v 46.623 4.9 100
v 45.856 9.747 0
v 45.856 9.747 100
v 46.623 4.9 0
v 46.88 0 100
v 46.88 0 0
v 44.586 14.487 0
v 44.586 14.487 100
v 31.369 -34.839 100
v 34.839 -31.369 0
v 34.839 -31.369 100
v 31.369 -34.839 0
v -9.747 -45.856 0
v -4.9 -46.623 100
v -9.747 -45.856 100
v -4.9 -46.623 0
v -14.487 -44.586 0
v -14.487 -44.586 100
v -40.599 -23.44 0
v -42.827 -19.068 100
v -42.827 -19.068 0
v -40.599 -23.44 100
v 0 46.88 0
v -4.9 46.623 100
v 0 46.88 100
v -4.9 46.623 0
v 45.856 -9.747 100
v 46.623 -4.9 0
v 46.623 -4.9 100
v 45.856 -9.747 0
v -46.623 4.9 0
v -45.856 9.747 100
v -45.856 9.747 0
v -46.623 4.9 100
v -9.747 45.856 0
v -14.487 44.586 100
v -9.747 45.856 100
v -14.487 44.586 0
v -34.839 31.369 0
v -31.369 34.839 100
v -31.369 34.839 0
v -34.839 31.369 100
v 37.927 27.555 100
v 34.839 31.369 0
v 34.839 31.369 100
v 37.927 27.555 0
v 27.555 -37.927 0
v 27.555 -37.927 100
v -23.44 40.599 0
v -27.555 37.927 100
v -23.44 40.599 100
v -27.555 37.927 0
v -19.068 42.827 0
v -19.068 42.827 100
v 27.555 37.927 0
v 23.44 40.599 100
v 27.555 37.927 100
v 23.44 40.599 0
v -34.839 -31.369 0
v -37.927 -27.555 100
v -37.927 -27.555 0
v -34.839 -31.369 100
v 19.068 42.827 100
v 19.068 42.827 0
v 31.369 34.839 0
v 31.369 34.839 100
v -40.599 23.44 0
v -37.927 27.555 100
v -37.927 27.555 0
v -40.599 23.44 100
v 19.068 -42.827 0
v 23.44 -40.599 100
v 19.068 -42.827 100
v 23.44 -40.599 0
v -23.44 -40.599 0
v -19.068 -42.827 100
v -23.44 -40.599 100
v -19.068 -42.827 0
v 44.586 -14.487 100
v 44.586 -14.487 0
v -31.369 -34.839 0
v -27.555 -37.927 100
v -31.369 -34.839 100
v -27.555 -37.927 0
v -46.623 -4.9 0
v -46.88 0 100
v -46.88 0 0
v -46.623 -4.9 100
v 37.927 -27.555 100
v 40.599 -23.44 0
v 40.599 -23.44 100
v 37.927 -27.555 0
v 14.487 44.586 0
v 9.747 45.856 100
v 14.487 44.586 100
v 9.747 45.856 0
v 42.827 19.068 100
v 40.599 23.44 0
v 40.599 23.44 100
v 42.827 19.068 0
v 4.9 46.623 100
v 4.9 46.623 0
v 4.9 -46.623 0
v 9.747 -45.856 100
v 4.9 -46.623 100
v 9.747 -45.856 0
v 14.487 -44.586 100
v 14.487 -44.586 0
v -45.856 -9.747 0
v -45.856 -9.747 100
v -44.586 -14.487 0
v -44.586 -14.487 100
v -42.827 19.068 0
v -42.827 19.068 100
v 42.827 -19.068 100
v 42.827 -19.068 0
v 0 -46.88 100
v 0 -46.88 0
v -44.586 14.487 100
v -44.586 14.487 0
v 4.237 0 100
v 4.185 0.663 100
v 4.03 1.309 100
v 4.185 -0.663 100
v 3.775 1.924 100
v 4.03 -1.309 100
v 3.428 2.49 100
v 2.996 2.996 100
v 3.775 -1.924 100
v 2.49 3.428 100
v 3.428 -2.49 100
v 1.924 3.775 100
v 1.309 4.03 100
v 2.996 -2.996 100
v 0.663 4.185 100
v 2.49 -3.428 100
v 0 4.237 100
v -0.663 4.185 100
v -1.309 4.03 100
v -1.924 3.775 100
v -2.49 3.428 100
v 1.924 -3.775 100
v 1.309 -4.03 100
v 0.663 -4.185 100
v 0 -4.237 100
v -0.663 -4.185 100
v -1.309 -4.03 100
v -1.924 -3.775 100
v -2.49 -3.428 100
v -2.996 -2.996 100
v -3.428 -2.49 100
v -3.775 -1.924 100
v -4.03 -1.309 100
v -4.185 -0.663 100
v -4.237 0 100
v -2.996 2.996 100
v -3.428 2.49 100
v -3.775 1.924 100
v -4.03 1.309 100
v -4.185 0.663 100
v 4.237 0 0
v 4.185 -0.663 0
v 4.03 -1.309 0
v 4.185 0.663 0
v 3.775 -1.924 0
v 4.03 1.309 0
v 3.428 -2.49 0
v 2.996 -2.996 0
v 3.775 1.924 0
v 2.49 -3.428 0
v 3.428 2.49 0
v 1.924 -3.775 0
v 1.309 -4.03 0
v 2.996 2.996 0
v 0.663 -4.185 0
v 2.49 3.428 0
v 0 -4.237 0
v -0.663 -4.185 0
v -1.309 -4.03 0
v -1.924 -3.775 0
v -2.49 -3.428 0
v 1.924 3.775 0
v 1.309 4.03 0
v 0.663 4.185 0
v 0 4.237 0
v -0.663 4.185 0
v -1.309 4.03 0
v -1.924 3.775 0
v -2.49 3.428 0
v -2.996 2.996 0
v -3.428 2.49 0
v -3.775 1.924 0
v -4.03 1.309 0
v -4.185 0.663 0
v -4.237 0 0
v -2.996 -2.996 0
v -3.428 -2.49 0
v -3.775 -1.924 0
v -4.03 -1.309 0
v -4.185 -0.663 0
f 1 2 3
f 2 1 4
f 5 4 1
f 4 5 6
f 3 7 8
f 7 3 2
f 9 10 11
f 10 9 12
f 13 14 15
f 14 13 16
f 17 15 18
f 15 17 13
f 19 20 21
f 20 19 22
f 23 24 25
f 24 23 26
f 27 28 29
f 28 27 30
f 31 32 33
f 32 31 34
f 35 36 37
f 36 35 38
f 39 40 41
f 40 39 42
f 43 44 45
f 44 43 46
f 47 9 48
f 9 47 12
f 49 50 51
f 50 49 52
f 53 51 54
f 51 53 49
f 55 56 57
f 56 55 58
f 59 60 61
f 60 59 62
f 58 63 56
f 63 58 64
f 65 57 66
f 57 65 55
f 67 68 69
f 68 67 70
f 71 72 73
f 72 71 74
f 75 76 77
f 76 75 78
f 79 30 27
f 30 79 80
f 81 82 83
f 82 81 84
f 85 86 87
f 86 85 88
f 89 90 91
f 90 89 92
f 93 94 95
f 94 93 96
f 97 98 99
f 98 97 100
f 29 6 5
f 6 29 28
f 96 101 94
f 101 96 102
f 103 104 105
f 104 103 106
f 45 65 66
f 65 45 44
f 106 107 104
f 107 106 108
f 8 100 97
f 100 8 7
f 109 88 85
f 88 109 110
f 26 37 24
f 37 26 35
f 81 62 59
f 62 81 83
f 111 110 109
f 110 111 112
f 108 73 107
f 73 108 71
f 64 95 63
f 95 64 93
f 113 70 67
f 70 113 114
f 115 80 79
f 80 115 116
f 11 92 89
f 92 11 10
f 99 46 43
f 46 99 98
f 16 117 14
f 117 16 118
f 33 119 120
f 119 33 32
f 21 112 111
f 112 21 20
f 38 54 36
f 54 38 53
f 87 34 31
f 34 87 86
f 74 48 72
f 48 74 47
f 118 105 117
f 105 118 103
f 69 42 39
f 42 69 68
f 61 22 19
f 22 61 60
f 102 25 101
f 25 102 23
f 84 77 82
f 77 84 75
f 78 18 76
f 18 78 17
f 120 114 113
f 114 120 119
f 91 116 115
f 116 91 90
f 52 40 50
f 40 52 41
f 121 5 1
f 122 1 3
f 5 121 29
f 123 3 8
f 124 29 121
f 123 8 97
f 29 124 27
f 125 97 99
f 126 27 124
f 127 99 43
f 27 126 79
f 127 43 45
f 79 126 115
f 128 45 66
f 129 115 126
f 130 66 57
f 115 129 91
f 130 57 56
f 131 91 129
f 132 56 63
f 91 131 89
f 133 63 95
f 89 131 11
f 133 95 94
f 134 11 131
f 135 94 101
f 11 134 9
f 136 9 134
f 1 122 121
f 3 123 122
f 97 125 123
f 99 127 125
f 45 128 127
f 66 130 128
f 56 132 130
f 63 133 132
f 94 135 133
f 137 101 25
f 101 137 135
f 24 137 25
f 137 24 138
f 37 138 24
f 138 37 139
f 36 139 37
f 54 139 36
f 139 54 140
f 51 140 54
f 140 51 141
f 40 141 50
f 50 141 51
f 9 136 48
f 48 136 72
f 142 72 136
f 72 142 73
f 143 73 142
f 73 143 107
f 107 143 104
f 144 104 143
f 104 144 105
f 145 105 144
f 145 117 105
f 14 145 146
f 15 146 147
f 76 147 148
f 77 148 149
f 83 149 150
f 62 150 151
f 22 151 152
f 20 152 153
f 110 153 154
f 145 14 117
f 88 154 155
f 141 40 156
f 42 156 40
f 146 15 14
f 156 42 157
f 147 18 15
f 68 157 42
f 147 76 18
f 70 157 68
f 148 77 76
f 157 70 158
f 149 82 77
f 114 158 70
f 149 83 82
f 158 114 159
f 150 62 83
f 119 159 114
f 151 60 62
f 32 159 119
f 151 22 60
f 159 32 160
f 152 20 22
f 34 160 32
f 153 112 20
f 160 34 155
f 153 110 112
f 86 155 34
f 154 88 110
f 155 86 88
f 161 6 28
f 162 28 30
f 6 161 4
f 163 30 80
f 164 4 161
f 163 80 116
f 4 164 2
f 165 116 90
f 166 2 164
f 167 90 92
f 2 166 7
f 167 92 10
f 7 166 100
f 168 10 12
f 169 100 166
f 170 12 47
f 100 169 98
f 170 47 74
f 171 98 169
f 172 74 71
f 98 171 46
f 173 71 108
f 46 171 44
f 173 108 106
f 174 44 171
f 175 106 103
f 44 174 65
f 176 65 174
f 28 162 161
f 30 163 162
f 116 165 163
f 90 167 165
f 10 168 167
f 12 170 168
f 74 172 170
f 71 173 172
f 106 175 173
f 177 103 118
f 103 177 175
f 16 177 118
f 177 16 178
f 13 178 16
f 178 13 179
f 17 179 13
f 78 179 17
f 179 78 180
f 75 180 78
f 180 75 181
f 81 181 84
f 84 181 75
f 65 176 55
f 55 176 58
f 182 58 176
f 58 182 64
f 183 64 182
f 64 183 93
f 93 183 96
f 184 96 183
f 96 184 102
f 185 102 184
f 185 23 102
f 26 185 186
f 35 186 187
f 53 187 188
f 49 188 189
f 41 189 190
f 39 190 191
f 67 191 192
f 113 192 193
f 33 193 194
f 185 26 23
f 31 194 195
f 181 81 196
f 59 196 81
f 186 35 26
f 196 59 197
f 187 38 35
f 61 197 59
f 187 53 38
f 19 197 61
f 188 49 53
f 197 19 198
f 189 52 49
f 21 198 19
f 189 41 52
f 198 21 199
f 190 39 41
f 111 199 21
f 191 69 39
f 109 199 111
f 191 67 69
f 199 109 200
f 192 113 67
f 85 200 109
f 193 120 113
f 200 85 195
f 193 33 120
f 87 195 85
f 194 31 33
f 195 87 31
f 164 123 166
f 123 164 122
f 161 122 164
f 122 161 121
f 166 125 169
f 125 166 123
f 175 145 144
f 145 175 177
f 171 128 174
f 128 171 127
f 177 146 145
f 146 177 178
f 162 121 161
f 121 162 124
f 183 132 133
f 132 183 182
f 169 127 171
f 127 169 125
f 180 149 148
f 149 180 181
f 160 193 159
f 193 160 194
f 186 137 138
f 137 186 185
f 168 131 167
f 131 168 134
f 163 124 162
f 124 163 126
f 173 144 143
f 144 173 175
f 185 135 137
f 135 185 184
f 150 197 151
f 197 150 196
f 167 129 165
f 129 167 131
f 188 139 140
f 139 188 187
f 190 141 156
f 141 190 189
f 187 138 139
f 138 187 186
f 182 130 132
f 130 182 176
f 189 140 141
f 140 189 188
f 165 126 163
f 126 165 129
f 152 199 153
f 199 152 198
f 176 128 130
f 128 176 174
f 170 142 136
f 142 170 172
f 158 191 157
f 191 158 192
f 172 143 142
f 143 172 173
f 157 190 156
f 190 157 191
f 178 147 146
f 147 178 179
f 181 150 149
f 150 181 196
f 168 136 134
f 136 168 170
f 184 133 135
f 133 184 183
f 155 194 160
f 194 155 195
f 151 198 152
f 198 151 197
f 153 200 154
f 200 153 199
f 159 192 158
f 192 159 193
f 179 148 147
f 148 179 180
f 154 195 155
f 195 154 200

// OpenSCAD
        wall_thickness = 6.67;
        bore_clearance = 2.237;
        roller_radius = 46.88;

        module roller() {
            difference() {
                cylinder(h=100, r=roller_radius, $fn=60);
                translate([0,0,-5])
                    cylinder(h=110, r=bore_clearance + 2, $fn=40);
            }
        }
        roller();
        
